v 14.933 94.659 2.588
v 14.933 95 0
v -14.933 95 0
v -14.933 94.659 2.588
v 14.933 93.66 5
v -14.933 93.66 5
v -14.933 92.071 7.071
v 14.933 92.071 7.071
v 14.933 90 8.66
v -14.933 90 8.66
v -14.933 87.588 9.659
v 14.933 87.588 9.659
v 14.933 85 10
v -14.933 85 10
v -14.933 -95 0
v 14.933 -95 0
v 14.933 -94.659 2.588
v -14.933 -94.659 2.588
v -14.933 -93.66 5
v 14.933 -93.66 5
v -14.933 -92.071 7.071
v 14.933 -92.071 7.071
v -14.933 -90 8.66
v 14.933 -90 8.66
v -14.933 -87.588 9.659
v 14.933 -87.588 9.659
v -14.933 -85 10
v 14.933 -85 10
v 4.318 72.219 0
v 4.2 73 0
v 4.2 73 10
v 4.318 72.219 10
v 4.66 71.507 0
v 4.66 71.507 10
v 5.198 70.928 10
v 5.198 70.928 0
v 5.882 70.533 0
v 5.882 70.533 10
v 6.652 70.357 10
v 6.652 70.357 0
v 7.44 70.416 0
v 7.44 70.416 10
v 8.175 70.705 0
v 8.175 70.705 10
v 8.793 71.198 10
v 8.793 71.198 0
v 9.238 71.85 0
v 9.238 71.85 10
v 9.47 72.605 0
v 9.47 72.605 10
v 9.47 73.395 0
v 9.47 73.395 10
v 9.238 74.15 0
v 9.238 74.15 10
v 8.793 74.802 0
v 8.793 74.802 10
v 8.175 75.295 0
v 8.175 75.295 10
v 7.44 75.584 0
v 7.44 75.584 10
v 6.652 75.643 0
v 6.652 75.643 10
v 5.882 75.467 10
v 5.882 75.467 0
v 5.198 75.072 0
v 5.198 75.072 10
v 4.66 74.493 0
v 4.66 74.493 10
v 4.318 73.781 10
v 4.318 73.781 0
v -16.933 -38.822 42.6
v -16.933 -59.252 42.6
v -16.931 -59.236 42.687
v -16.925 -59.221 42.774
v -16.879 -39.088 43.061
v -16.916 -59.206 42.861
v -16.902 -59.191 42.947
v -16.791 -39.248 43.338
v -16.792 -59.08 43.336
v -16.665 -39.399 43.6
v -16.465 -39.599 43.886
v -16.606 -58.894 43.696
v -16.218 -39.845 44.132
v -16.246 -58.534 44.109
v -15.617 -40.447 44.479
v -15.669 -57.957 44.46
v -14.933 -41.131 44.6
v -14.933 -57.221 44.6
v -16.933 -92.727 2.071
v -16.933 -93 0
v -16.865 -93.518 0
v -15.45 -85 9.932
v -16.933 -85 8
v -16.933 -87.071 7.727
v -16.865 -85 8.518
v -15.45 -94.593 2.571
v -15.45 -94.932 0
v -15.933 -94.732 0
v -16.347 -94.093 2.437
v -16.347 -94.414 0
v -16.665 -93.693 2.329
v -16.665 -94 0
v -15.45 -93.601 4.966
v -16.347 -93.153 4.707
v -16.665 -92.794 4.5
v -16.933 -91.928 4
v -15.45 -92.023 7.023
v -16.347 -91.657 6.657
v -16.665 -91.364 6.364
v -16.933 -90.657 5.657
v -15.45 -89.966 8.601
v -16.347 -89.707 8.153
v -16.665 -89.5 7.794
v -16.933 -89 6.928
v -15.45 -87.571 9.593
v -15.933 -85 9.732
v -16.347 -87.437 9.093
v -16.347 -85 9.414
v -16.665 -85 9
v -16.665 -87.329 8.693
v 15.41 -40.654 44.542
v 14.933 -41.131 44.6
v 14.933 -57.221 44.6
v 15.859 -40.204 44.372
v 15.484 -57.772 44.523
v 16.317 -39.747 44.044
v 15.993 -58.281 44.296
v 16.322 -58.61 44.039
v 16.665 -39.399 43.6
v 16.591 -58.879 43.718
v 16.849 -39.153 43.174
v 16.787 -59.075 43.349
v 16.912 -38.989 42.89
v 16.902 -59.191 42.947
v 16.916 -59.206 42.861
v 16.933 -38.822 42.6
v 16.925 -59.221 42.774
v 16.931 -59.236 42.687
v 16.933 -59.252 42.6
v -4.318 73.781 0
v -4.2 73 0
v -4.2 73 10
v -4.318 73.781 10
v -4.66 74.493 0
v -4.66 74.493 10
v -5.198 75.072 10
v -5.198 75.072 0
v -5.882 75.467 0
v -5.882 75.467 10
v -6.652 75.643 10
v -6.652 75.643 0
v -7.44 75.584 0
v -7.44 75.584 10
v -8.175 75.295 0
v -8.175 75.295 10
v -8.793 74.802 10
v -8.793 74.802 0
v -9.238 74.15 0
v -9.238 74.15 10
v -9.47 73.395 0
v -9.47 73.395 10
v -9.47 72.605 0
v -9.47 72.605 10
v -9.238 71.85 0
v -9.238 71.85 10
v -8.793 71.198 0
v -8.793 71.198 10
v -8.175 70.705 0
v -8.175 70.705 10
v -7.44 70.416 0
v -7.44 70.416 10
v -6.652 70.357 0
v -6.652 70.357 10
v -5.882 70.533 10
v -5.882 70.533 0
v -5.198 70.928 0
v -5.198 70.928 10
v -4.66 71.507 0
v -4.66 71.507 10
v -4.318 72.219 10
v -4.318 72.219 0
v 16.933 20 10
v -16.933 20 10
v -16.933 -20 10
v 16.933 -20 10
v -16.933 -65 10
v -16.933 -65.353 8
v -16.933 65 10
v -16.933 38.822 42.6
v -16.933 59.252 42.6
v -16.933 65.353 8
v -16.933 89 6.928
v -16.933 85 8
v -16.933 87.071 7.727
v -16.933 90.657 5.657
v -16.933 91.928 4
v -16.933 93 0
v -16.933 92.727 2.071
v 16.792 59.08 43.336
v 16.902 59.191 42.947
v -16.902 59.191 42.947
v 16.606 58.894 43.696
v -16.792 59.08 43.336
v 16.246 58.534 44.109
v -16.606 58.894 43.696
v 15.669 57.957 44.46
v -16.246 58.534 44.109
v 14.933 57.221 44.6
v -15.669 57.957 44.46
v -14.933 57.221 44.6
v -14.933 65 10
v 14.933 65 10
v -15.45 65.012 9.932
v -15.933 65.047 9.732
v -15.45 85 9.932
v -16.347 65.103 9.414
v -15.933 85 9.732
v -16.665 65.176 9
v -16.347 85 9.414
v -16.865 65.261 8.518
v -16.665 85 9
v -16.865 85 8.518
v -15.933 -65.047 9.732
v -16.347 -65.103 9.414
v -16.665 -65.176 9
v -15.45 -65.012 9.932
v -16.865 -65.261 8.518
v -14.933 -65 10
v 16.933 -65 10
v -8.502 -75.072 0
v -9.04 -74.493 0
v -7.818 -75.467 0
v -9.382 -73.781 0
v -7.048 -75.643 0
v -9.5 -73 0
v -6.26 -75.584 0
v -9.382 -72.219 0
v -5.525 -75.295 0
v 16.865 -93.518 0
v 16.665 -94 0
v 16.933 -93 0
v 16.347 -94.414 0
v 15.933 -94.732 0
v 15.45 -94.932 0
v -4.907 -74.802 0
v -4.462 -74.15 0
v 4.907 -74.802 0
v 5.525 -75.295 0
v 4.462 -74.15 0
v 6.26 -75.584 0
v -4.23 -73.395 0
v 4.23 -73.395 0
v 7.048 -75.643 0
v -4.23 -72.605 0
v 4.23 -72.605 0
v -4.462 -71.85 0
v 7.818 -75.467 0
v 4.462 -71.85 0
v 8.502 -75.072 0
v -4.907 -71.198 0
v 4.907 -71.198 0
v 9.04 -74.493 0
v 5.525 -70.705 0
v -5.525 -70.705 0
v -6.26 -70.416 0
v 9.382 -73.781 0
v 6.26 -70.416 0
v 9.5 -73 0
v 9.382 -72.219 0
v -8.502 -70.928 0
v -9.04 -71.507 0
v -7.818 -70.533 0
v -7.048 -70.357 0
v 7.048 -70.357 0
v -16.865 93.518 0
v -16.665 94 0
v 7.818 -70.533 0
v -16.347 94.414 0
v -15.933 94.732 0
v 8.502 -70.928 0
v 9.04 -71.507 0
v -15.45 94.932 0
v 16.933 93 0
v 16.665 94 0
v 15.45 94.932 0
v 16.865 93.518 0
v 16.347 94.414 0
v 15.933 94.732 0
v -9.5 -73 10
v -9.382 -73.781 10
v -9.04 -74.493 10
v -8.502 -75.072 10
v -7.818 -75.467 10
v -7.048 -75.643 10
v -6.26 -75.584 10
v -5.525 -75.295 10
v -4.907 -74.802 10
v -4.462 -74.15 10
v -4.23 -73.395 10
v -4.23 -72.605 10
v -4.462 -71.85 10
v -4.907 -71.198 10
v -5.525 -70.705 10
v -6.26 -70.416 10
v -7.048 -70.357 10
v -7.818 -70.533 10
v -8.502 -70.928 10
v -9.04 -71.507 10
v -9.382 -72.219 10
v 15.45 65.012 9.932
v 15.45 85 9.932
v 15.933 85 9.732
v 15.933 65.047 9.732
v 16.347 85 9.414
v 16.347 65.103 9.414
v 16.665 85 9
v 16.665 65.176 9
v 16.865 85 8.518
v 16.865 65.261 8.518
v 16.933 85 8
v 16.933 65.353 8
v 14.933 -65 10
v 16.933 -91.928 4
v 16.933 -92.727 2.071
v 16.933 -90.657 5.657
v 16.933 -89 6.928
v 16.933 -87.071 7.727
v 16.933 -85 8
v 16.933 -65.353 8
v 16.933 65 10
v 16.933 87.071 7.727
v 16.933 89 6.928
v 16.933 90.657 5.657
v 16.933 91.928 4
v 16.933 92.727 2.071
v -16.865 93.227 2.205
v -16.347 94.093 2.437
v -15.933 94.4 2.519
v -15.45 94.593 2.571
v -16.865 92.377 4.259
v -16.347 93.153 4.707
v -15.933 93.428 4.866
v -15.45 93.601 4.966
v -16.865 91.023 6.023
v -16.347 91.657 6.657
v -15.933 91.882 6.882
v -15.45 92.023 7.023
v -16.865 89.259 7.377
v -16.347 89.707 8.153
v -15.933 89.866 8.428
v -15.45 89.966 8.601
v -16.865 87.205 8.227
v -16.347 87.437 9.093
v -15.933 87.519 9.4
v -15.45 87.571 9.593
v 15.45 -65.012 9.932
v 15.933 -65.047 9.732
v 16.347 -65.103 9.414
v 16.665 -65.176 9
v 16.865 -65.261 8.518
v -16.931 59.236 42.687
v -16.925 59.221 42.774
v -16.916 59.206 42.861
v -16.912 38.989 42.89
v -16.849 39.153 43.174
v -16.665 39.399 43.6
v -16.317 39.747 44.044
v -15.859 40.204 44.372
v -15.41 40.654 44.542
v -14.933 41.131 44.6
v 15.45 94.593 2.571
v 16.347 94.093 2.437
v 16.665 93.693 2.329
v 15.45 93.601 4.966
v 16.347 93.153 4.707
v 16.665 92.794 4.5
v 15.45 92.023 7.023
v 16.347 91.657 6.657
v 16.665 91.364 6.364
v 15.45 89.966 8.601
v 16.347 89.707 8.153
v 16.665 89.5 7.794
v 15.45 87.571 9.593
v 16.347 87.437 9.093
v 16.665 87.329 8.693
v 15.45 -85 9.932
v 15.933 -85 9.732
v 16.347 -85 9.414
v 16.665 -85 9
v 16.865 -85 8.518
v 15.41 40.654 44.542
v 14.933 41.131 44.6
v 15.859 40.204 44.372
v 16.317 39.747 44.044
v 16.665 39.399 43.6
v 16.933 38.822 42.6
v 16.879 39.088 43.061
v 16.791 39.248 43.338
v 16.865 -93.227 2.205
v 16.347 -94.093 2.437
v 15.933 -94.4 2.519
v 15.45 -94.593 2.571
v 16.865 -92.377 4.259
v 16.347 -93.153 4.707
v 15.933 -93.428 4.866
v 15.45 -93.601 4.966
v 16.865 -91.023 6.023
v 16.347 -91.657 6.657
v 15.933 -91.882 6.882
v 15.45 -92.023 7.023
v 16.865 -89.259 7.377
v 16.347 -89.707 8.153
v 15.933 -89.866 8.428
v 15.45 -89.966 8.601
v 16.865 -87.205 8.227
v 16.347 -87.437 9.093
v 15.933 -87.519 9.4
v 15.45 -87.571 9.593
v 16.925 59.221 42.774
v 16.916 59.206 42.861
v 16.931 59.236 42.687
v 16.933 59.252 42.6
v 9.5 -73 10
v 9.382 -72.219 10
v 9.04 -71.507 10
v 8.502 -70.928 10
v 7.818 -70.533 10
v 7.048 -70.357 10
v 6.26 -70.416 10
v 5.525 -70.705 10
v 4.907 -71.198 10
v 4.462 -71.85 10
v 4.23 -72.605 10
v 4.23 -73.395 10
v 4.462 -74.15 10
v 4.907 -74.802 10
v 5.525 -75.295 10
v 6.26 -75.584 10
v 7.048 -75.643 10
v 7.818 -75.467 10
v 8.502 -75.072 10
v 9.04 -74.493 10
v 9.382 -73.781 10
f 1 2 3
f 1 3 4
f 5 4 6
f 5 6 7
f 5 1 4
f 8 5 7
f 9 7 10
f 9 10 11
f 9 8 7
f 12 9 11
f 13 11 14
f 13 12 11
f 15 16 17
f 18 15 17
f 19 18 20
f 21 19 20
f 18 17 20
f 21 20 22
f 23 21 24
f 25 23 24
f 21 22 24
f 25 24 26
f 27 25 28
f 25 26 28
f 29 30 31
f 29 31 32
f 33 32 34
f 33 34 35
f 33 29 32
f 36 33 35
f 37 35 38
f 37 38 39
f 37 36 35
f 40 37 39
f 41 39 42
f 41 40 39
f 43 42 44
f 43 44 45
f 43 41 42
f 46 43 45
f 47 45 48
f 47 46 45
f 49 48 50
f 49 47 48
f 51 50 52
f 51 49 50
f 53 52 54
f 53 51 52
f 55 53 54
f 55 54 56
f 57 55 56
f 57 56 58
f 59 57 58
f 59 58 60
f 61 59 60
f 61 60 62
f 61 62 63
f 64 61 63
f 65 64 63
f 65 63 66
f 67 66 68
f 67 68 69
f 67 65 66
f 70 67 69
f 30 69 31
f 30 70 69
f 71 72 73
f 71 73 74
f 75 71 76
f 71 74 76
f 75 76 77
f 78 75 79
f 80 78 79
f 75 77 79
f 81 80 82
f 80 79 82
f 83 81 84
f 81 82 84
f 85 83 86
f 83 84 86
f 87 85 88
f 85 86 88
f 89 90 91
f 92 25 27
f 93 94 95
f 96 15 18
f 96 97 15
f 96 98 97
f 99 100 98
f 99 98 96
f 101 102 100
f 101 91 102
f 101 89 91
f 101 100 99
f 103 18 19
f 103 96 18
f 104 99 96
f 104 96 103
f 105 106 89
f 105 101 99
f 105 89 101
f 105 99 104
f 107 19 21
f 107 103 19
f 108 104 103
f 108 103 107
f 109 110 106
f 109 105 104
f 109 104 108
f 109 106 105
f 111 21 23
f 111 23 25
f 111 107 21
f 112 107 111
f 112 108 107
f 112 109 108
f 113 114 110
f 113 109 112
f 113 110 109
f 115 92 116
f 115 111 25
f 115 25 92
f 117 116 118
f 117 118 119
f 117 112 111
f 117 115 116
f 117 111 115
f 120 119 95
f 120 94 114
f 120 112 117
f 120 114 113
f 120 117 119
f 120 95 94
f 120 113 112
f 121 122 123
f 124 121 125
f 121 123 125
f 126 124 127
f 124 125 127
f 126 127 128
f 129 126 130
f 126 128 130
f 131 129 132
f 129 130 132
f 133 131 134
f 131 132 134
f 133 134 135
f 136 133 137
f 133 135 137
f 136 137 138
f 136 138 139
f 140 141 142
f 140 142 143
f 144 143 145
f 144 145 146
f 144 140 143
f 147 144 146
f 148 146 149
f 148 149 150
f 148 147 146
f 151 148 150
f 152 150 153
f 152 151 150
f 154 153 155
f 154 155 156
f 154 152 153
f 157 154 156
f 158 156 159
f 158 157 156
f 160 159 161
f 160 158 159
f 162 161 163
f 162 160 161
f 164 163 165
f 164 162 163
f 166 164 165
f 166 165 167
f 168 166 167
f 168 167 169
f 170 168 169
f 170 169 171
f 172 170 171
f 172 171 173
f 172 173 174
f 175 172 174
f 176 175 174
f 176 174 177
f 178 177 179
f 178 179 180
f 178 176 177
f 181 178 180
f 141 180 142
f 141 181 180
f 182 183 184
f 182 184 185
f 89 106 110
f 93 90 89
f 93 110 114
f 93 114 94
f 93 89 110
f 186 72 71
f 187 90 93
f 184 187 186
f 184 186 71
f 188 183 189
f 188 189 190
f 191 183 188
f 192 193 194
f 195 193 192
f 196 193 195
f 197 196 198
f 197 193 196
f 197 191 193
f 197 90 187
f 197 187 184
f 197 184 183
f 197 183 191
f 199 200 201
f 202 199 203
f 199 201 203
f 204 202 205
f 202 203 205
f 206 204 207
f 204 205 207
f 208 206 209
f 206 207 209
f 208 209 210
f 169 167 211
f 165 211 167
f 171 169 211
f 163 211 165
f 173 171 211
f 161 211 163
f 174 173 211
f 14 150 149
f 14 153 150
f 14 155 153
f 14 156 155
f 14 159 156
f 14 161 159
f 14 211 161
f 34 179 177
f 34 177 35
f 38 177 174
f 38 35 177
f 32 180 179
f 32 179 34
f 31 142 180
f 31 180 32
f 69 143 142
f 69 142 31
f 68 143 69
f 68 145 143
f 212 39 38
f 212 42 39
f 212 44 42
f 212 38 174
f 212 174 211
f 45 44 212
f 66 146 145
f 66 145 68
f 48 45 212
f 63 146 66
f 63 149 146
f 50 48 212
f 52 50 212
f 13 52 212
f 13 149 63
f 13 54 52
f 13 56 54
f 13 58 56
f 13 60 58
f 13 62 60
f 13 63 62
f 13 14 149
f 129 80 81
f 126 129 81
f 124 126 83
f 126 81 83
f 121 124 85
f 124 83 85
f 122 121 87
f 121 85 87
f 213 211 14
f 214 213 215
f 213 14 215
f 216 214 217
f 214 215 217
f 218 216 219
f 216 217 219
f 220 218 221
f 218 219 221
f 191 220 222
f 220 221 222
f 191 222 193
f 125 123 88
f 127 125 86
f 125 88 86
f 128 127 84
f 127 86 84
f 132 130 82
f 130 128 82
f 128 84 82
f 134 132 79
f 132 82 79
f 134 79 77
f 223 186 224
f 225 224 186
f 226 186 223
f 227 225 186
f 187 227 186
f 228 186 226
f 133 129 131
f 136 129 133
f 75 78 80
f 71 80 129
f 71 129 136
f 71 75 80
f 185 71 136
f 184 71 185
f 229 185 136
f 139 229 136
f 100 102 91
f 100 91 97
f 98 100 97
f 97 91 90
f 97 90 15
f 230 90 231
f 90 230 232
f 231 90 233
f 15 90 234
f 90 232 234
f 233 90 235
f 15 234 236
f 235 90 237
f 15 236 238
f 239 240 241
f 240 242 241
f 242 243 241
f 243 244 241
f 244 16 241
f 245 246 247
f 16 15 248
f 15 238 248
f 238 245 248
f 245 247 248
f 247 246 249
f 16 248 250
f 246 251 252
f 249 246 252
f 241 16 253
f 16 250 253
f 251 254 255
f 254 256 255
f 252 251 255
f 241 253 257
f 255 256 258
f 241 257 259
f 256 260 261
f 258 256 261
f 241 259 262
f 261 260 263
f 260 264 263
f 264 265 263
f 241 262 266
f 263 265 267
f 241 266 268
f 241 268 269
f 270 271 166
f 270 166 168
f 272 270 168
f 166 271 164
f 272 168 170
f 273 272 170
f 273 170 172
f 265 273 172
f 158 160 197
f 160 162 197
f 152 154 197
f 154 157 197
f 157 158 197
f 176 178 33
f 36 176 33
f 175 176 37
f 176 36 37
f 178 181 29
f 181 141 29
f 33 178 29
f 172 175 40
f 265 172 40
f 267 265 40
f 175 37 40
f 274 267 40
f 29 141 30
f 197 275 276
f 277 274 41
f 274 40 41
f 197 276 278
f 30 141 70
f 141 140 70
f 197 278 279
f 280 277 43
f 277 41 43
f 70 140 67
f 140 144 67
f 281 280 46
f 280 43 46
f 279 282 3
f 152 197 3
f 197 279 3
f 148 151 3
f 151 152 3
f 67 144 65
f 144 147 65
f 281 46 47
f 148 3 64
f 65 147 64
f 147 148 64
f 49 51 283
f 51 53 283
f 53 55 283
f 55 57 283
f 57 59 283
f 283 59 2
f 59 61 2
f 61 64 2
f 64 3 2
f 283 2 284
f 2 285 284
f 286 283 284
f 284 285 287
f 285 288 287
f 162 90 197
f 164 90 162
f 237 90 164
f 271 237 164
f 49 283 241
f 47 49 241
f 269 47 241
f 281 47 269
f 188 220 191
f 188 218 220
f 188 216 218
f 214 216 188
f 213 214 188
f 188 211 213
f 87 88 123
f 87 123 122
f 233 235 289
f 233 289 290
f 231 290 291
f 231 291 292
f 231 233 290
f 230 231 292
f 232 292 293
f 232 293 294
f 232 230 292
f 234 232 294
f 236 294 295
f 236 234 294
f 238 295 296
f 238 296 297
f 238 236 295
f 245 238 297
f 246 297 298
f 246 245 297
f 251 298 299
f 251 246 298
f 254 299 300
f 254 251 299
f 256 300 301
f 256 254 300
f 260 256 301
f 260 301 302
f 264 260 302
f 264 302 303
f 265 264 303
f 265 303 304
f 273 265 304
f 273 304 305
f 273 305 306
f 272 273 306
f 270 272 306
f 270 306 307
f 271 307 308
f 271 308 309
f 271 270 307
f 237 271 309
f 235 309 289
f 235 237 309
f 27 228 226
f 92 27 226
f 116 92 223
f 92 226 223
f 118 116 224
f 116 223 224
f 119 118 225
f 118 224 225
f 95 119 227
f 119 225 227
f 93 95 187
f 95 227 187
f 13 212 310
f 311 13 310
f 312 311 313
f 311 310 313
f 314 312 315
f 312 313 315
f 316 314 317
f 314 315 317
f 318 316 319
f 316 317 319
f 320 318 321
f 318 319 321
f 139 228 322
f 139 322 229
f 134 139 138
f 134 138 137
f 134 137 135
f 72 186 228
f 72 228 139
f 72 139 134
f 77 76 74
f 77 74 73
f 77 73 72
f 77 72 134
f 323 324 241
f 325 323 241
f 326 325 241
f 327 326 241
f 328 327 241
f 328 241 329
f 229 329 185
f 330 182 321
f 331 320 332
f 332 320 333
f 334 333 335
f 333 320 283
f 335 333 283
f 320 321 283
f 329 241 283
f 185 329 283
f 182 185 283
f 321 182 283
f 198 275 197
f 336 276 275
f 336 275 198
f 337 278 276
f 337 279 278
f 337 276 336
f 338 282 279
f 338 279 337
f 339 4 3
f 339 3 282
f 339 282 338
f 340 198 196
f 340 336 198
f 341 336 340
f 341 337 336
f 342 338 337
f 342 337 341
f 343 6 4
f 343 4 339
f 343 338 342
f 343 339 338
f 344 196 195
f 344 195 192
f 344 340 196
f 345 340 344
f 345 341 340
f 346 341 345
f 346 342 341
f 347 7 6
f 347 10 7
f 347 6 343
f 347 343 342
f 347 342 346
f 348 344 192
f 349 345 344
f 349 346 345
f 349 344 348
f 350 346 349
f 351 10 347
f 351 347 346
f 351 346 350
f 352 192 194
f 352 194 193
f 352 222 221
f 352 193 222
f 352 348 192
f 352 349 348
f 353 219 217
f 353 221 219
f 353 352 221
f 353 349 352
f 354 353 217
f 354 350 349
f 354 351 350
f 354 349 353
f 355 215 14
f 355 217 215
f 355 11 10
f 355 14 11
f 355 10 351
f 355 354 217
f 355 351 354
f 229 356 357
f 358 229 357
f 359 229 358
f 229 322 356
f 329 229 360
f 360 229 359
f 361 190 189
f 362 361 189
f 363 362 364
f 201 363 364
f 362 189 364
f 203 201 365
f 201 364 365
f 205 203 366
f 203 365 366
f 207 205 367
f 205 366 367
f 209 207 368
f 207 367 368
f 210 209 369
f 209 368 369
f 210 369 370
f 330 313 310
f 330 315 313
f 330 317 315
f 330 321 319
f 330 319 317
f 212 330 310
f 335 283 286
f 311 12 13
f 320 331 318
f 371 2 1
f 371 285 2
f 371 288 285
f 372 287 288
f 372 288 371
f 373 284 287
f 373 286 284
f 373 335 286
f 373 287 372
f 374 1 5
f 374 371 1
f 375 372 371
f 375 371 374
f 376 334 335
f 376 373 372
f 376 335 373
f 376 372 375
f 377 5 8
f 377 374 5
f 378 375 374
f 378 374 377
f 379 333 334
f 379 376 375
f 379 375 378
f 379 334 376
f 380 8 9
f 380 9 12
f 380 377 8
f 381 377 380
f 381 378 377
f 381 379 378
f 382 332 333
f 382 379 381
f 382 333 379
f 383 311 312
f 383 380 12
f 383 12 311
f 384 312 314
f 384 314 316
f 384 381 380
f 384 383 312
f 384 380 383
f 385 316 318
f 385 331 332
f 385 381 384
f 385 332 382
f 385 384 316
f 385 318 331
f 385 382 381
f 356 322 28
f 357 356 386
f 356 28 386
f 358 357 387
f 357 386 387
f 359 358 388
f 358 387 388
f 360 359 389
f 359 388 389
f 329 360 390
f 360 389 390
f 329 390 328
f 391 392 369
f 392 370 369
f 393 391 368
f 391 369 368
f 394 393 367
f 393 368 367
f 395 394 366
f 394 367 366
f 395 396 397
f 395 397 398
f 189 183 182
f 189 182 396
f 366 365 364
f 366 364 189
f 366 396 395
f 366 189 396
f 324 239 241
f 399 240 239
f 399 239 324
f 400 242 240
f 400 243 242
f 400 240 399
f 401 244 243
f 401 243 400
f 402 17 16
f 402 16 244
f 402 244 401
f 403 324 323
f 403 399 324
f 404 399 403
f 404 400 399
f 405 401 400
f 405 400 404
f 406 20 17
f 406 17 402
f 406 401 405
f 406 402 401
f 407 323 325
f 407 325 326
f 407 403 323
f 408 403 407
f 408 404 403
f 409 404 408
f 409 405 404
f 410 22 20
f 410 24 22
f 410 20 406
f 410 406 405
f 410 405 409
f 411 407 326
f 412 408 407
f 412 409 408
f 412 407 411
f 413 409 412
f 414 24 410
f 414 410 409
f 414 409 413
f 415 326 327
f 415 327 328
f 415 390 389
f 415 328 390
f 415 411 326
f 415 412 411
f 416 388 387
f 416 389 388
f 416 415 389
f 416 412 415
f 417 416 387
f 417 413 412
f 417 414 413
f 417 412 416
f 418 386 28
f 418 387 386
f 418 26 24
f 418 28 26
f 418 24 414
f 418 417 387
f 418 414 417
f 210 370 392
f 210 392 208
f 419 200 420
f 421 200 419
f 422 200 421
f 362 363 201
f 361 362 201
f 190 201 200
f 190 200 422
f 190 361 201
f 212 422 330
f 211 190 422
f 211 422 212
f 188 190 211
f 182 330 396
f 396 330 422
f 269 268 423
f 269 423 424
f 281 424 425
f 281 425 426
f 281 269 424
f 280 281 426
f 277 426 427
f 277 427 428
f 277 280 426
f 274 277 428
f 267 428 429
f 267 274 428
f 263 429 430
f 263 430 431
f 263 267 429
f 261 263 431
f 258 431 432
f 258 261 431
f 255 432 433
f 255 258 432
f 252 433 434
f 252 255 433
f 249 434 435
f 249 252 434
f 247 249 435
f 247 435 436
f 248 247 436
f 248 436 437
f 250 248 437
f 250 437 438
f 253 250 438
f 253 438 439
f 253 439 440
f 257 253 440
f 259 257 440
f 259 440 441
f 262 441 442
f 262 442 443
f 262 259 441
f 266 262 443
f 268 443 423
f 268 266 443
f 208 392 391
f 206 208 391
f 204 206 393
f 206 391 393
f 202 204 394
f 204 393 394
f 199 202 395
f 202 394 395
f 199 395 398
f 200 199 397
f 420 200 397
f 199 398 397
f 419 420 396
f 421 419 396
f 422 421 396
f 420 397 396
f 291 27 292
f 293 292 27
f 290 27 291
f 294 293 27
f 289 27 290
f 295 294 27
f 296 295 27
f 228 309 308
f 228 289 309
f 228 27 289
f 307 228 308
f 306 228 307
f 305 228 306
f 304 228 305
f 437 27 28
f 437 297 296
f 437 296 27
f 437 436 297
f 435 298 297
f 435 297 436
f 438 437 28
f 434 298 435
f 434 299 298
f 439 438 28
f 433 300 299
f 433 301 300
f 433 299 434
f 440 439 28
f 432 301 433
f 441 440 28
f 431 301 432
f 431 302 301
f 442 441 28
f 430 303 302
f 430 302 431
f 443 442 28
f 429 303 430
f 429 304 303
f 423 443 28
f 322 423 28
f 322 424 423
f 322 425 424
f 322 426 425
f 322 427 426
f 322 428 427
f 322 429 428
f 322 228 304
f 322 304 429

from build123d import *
from build123d.topology import SkipClean

# Parameters (mm, degrees)
SKETCH_1_W      = 33.865609136
SKETCH_1_H      = 190
SKETCH_1_R      = 2.65
EXTRUDE_1_DEPTH = 10
FILLET_1_R      = 10
EXTRUDE_2_DEPTH = 33.865609
FILLET_2_R      = 2


# Some blends are built 0.0001 mm under size
with BuildPart() as part:
    # 草图1 → 凸台-拉伸1 (new body)
    with BuildSketch(Plane.XY):
        Rectangle(SKETCH_1_W, SKETCH_1_H)
        with Locations((-6.85, 73)):
            Circle(SKETCH_1_R, mode=Mode.SUBTRACT)
        with Locations(Location((6.85, 73, 0), (0, 0, 180))):
            Circle(SKETCH_1_R, mode=Mode.SUBTRACT)
        with Locations(Location((-6.85, -73, 0), (0, 0, 180))):
            Circle(SKETCH_1_R, mode=Mode.SUBTRACT)
        with Locations((6.85, -73)):
            Circle(SKETCH_1_R, mode=Mode.SUBTRACT)
    extrude(amount=EXTRUDE_1_DEPTH)

    # 圆角1
    fillet_1_edges = [part.edges().sort_by_distance(p)[0] for p in [
        (0, -95, 10),
        (0, 95, 10),
    ]]
    fillet(fillet_1_edges, radius=FILLET_1_R - 0.0001)  # a hair under: the kernel refuses the full size

    # 草图2 → 凸台-拉伸2 (add, through all)
    with SkipClean():  # the faces are left unmerged after this step: merging them gives an invalid solid
        with BuildSketch(Plane.ZY.offset(16.932804568)):
            Polygon((44.6, 58.899086467), (10, 65), (10, 20), (44.6, 39.976319314), align=None)
            Polygon((44.6, -39.976319314), (10, -20), (10, -65), (44.6, -58.899086467), align=None)
        extrude(amount=-EXTRUDE_2_DEPTH)

    # 圆角2
    # the kernel refuses this fillet: 2 mm, written as the material it takes off along each edge
    with BuildSketch(Plane(origin=(16.932804568, -85.0001, 10), x_dir=(0, 0, -1), z_dir=(0, 1, 0))) as fillet_2_piece_1_section:
        with BuildLine():
            CenterArc((FILLET_2_R, FILLET_2_R), FILLET_2_R, 180, 90)
            Line((0, FILLET_2_R), (0, 0))
            Line((0, 0), (FILLET_2_R, 0))
        make_face()
    fillet_2_piece_1 = extrude(amount=25.0001, mode=Mode.PRIVATE)
    fillet_2_piece_1 = split(fillet_2_piece_1, bisect_by=Plane(origin=(16.479042192, -65.37988803, 7.84554792), z_dir=(0, -0.9848077530122075, 0.17364817766693394)), keep=Keep.TOP, mode=Mode.PRIVATE)
    add(fillet_2_piece_1, mode=Mode.SUBTRACT)
    with BuildSketch(Plane(origin=(-16.932804568, 85.0001, 10), x_dir=(0, 0, -1), z_dir=(0, -1, 0))) as fillet_2_piece_2_section:
        with BuildLine():
            CenterArc((FILLET_2_R, FILLET_2_R), FILLET_2_R, 180, 90)
            Line((0, FILLET_2_R), (0, 0))
            Line((0, 0), (FILLET_2_R, 0))
        make_face()
    fillet_2_piece_2 = extrude(amount=25.0001, mode=Mode.PRIVATE)
    fillet_2_piece_2 = split(fillet_2_piece_2, bisect_by=Plane(origin=(-16.479042192, 65.37988803, 7.84554792), z_dir=(0, 0.9848077530122075, 0.17364817766693394)), keep=Keep.TOP, mode=Mode.PRIVATE)
    add(fillet_2_piece_2, mode=Mode.SUBTRACT)
    with BuildSketch(Plane(origin=(16.932804568, 85.0001, 0.0001), x_dir=(0, 1, 0), z_dir=(0, 0, -1))) as fillet_2_piece_3:
        with BuildLine():
            CenterArc((9.9999 - FILLET_2_R, -FILLET_2_R), FILLET_2_R, 0, 90)
            Line((9.9999, -FILLET_2_R), (9.9999, 0))
            Line((9.9999, 0), (9.9999 - FILLET_2_R, 0))
        make_face()
    revolve(axis=Axis((16.932804568, 85.0001, 0.0001), (1, 0, 0)), revolution_arc=90, mode=Mode.SUBTRACT)
    with BuildSketch(Plane(origin=(16.932804568, -85.0001, 0.0001), x_dir=(0, -1, 0), z_dir=(0, 0, -1))) as fillet_2_piece_4:
        with BuildLine():
            CenterArc((9.9999 - FILLET_2_R, FILLET_2_R), FILLET_2_R, 270, 90)
            Line((9.9999 - FILLET_2_R, 0), (9.9999, 0))
            Line((9.9999, 0), (9.9999, FILLET_2_R))
        make_face()
    revolve(axis=Axis((16.932804568, -85.0001, 0.0001), (-1, 0, 0)), revolution_arc=90, mode=Mode.SUBTRACT)
    with BuildSketch(Plane(origin=(-16.932804568, 85.0001, 0.0001), x_dir=(0, 1, 0), z_dir=(0, 0, -1))) as fillet_2_piece_5:
        with BuildLine():
            CenterArc((9.9999 - FILLET_2_R, FILLET_2_R), FILLET_2_R, 270, 90)
            Line((9.9999, FILLET_2_R), (9.9999, 0))
            Line((9.9999, 0), (9.9999 - FILLET_2_R, 0))
        make_face()
    revolve(axis=Axis((-16.932804568, 85.0001, 0.0001), (1, 0, 0)), revolution_arc=90, mode=Mode.SUBTRACT)
    with BuildSketch(Plane(origin=(-16.932804568, -85.0001, 0.0001), x_dir=(0, -1, 0), z_dir=(0, 0, -1))) as fillet_2_piece_6:
        with BuildLine():
            CenterArc((9.9999 - FILLET_2_R, -FILLET_2_R), FILLET_2_R, 0, 90)
            Line((9.9999, -FILLET_2_R), (9.9999, 0))
            Line((9.9999, 0), (9.9999 - FILLET_2_R, 0))
        make_face()
    revolve(axis=Axis((-16.932804568, -85.0001, 0.0001), (-1, 0, 0)), revolution_arc=90, mode=Mode.SUBTRACT)
    with BuildSketch(Plane(origin=(16.932804568, 60, 10), x_dir=(0, 0, -1), z_dir=(0, 1, 0))) as fillet_2_piece_7_section:
        with BuildLine():
            CenterArc((FILLET_2_R, FILLET_2_R), FILLET_2_R, 180, 90)
            Line((0, FILLET_2_R), (0, 0))
            Line((0, 0), (FILLET_2_R, 0))
        make_face()
    fillet_2_piece_7 = extrude(amount=25.0001, mode=Mode.PRIVATE)
    fillet_2_piece_7 = split(fillet_2_piece_7, bisect_by=Plane(origin=(16.479042192, 65.37988803, 7.84554792), z_dir=(0, 0.9848077530122075, 0.17364817766693394)), keep=Keep.TOP, mode=Mode.PRIVATE)
    add(fillet_2_piece_7, mode=Mode.SUBTRACT)
    with BuildSketch(Plane(origin=(-19.819555914, 39.976319314, 44.6), x_dir=(0, -0.5000000000000052, -0.8660254037844355), z_dir=(1, 0, 0))) as fillet_2_piece_8:
        with BuildLine():
            CenterArc((FILLET_2_R * 0.57735026919, FILLET_2_R), FILLET_2_R, 210, 60)
            Line((-FILLET_2_R * 0.288675134595, FILLET_2_R * 0.5), (0, 0))
            Line((0, 0), (FILLET_2_R * 0.57735026919, 0))
        make_face()
    extrude(amount=39.639111692, mode=Mode.SUBTRACT)
    with BuildSketch(Plane(origin=(-16.932804568, 34.976319314, 44.6), x_dir=(0, 0, -1), z_dir=(0, 1, 0)), Plane(origin=(-16.932804568, -63.899086467, 44.6), x_dir=(0, 0, -1), z_dir=(0, 1, 0))) as fillet_2_piece_9:
        with BuildLine():
            CenterArc((FILLET_2_R, -FILLET_2_R), FILLET_2_R, 90, 90)
            Line((0, -FILLET_2_R), (0, 0))
            Line((0, 0), (FILLET_2_R, 0))
        make_face()
    extrude(amount=28.922767154, mode=Mode.SUBTRACT)
    with BuildSketch(Plane(origin=(-21.128302724, 58.899086467, 44.6), x_dir=(0, 0.17364817766693522, -0.9848077530122071), z_dir=(1, 0, 0))) as fillet_2_piece_10:
        with BuildLine():
            CenterArc((FILLET_2_R * 0.839099631177, -FILLET_2_R), FILLET_2_R, 90, 80)
            Line((-FILLET_2_R * 0.145708121835, -FILLET_2_R * 0.826351822333), (0, 0))
            Line((0, 0), (FILLET_2_R * 0.839099631177, 0))
        make_face()
    extrude(amount=42.256605312, mode=Mode.SUBTRACT)
    with BuildSketch(Plane(origin=(16.932804432, 34.976319314, 44.6), x_dir=(0, 0, -1), z_dir=(0, 1, 0)), Plane(origin=(16.932804432, -63.899086467, 44.6), x_dir=(0, 0, -1), z_dir=(0, 1, 0))) as fillet_2_piece_11:
        with BuildLine():
            CenterArc((FILLET_2_R, FILLET_2_R), FILLET_2_R, 180, 90)
            Line((0, FILLET_2_R), (0, 0))
            Line((0, 0), (FILLET_2_R, 0))
        make_face()
    extrude(amount=28.922767154, mode=Mode.SUBTRACT)
    with BuildSketch(Plane(origin=(-16.932804568, -60, 10), x_dir=(0, 0, -1), z_dir=(0, -1, 0))) as fillet_2_piece_12_section:
        with BuildLine():
            CenterArc((FILLET_2_R, FILLET_2_R), FILLET_2_R, 180, 90)
            Line((0, FILLET_2_R), (0, 0))
            Line((0, 0), (FILLET_2_R, 0))
        make_face()
    fillet_2_piece_12 = extrude(amount=25.0001, mode=Mode.PRIVATE)
    fillet_2_piece_12 = split(fillet_2_piece_12, bisect_by=Plane(origin=(-16.479042192, -65.37988803, 7.84554792), z_dir=(0, -0.9848077530122075, 0.17364817766693394)), keep=Keep.TOP, mode=Mode.PRIVATE)
    add(fillet_2_piece_12, mode=Mode.SUBTRACT)
    with BuildSketch(Plane(origin=(-19.819555914, -39.976319314, 44.6), x_dir=(0, 0.5000000000000052, -0.8660254037844355), z_dir=(1, 0, 0))) as fillet_2_piece_13:
        with BuildLine():
            CenterArc((FILLET_2_R * 0.57735026919, -FILLET_2_R), FILLET_2_R, 90, 60)
            Line((-FILLET_2_R * 0.288675134595, -FILLET_2_R * 0.5), (0, 0))
            Line((0, 0), (FILLET_2_R * 0.57735026919, 0))
        make_face()
    extrude(amount=39.639111692, mode=Mode.SUBTRACT)
    with BuildSketch(Plane(origin=(-21.128302724, -58.899086467, 44.6), x_dir=(0, -0.17364817766693183, -0.9848077530122078), z_dir=(1, 0, 0))) as fillet_2_piece_14:
        with BuildLine():
            CenterArc((FILLET_2_R * 0.839099631177, FILLET_2_R), FILLET_2_R, 190, 80)
            Line((-FILLET_2_R * 0.145708121835, FILLET_2_R * 0.826351822333), (0, 0))
            Line((0, 0), (FILLET_2_R * 0.839099631177, 0))
        make_face()
    extrude(amount=42.256605312, mode=Mode.SUBTRACT)
    with BuildSketch(Plane(origin=(-16.932804568, -95, -5), x_dir=(1, 0, 0), z_dir=(0, 0, 1)), Plane(origin=(-16.932804568, 95, -5), x_dir=(0, -1, 0), z_dir=(0, 0, 1))) as fillet_2_piece_15:
        with BuildLine():
            CenterArc((FILLET_2_R, FILLET_2_R), FILLET_2_R, 180, 90)
            Line((0, FILLET_2_R), (0, 0))
            Line((0, 0), (FILLET_2_R, 0))
        make_face()
    extrude(amount=5.0001, mode=Mode.SUBTRACT)
    with BuildSketch(Plane(origin=(16.932804568, -95, -5), x_dir=(-1, 0, 0), z_dir=(0, 0, 1)), Plane(origin=(16.932804568, 95, -5), x_dir=(0, -1, 0), z_dir=(0, 0, 1))) as fillet_2_piece_16:
        with BuildLine():
            CenterArc((FILLET_2_R, -FILLET_2_R), FILLET_2_R, 90, 90)
            Line((0, -FILLET_2_R), (0, 0))
            Line((0, 0), (FILLET_2_R, 0))
        make_face()
    extrude(amount=5.0001, mode=Mode.SUBTRACT)


solid = part.part
